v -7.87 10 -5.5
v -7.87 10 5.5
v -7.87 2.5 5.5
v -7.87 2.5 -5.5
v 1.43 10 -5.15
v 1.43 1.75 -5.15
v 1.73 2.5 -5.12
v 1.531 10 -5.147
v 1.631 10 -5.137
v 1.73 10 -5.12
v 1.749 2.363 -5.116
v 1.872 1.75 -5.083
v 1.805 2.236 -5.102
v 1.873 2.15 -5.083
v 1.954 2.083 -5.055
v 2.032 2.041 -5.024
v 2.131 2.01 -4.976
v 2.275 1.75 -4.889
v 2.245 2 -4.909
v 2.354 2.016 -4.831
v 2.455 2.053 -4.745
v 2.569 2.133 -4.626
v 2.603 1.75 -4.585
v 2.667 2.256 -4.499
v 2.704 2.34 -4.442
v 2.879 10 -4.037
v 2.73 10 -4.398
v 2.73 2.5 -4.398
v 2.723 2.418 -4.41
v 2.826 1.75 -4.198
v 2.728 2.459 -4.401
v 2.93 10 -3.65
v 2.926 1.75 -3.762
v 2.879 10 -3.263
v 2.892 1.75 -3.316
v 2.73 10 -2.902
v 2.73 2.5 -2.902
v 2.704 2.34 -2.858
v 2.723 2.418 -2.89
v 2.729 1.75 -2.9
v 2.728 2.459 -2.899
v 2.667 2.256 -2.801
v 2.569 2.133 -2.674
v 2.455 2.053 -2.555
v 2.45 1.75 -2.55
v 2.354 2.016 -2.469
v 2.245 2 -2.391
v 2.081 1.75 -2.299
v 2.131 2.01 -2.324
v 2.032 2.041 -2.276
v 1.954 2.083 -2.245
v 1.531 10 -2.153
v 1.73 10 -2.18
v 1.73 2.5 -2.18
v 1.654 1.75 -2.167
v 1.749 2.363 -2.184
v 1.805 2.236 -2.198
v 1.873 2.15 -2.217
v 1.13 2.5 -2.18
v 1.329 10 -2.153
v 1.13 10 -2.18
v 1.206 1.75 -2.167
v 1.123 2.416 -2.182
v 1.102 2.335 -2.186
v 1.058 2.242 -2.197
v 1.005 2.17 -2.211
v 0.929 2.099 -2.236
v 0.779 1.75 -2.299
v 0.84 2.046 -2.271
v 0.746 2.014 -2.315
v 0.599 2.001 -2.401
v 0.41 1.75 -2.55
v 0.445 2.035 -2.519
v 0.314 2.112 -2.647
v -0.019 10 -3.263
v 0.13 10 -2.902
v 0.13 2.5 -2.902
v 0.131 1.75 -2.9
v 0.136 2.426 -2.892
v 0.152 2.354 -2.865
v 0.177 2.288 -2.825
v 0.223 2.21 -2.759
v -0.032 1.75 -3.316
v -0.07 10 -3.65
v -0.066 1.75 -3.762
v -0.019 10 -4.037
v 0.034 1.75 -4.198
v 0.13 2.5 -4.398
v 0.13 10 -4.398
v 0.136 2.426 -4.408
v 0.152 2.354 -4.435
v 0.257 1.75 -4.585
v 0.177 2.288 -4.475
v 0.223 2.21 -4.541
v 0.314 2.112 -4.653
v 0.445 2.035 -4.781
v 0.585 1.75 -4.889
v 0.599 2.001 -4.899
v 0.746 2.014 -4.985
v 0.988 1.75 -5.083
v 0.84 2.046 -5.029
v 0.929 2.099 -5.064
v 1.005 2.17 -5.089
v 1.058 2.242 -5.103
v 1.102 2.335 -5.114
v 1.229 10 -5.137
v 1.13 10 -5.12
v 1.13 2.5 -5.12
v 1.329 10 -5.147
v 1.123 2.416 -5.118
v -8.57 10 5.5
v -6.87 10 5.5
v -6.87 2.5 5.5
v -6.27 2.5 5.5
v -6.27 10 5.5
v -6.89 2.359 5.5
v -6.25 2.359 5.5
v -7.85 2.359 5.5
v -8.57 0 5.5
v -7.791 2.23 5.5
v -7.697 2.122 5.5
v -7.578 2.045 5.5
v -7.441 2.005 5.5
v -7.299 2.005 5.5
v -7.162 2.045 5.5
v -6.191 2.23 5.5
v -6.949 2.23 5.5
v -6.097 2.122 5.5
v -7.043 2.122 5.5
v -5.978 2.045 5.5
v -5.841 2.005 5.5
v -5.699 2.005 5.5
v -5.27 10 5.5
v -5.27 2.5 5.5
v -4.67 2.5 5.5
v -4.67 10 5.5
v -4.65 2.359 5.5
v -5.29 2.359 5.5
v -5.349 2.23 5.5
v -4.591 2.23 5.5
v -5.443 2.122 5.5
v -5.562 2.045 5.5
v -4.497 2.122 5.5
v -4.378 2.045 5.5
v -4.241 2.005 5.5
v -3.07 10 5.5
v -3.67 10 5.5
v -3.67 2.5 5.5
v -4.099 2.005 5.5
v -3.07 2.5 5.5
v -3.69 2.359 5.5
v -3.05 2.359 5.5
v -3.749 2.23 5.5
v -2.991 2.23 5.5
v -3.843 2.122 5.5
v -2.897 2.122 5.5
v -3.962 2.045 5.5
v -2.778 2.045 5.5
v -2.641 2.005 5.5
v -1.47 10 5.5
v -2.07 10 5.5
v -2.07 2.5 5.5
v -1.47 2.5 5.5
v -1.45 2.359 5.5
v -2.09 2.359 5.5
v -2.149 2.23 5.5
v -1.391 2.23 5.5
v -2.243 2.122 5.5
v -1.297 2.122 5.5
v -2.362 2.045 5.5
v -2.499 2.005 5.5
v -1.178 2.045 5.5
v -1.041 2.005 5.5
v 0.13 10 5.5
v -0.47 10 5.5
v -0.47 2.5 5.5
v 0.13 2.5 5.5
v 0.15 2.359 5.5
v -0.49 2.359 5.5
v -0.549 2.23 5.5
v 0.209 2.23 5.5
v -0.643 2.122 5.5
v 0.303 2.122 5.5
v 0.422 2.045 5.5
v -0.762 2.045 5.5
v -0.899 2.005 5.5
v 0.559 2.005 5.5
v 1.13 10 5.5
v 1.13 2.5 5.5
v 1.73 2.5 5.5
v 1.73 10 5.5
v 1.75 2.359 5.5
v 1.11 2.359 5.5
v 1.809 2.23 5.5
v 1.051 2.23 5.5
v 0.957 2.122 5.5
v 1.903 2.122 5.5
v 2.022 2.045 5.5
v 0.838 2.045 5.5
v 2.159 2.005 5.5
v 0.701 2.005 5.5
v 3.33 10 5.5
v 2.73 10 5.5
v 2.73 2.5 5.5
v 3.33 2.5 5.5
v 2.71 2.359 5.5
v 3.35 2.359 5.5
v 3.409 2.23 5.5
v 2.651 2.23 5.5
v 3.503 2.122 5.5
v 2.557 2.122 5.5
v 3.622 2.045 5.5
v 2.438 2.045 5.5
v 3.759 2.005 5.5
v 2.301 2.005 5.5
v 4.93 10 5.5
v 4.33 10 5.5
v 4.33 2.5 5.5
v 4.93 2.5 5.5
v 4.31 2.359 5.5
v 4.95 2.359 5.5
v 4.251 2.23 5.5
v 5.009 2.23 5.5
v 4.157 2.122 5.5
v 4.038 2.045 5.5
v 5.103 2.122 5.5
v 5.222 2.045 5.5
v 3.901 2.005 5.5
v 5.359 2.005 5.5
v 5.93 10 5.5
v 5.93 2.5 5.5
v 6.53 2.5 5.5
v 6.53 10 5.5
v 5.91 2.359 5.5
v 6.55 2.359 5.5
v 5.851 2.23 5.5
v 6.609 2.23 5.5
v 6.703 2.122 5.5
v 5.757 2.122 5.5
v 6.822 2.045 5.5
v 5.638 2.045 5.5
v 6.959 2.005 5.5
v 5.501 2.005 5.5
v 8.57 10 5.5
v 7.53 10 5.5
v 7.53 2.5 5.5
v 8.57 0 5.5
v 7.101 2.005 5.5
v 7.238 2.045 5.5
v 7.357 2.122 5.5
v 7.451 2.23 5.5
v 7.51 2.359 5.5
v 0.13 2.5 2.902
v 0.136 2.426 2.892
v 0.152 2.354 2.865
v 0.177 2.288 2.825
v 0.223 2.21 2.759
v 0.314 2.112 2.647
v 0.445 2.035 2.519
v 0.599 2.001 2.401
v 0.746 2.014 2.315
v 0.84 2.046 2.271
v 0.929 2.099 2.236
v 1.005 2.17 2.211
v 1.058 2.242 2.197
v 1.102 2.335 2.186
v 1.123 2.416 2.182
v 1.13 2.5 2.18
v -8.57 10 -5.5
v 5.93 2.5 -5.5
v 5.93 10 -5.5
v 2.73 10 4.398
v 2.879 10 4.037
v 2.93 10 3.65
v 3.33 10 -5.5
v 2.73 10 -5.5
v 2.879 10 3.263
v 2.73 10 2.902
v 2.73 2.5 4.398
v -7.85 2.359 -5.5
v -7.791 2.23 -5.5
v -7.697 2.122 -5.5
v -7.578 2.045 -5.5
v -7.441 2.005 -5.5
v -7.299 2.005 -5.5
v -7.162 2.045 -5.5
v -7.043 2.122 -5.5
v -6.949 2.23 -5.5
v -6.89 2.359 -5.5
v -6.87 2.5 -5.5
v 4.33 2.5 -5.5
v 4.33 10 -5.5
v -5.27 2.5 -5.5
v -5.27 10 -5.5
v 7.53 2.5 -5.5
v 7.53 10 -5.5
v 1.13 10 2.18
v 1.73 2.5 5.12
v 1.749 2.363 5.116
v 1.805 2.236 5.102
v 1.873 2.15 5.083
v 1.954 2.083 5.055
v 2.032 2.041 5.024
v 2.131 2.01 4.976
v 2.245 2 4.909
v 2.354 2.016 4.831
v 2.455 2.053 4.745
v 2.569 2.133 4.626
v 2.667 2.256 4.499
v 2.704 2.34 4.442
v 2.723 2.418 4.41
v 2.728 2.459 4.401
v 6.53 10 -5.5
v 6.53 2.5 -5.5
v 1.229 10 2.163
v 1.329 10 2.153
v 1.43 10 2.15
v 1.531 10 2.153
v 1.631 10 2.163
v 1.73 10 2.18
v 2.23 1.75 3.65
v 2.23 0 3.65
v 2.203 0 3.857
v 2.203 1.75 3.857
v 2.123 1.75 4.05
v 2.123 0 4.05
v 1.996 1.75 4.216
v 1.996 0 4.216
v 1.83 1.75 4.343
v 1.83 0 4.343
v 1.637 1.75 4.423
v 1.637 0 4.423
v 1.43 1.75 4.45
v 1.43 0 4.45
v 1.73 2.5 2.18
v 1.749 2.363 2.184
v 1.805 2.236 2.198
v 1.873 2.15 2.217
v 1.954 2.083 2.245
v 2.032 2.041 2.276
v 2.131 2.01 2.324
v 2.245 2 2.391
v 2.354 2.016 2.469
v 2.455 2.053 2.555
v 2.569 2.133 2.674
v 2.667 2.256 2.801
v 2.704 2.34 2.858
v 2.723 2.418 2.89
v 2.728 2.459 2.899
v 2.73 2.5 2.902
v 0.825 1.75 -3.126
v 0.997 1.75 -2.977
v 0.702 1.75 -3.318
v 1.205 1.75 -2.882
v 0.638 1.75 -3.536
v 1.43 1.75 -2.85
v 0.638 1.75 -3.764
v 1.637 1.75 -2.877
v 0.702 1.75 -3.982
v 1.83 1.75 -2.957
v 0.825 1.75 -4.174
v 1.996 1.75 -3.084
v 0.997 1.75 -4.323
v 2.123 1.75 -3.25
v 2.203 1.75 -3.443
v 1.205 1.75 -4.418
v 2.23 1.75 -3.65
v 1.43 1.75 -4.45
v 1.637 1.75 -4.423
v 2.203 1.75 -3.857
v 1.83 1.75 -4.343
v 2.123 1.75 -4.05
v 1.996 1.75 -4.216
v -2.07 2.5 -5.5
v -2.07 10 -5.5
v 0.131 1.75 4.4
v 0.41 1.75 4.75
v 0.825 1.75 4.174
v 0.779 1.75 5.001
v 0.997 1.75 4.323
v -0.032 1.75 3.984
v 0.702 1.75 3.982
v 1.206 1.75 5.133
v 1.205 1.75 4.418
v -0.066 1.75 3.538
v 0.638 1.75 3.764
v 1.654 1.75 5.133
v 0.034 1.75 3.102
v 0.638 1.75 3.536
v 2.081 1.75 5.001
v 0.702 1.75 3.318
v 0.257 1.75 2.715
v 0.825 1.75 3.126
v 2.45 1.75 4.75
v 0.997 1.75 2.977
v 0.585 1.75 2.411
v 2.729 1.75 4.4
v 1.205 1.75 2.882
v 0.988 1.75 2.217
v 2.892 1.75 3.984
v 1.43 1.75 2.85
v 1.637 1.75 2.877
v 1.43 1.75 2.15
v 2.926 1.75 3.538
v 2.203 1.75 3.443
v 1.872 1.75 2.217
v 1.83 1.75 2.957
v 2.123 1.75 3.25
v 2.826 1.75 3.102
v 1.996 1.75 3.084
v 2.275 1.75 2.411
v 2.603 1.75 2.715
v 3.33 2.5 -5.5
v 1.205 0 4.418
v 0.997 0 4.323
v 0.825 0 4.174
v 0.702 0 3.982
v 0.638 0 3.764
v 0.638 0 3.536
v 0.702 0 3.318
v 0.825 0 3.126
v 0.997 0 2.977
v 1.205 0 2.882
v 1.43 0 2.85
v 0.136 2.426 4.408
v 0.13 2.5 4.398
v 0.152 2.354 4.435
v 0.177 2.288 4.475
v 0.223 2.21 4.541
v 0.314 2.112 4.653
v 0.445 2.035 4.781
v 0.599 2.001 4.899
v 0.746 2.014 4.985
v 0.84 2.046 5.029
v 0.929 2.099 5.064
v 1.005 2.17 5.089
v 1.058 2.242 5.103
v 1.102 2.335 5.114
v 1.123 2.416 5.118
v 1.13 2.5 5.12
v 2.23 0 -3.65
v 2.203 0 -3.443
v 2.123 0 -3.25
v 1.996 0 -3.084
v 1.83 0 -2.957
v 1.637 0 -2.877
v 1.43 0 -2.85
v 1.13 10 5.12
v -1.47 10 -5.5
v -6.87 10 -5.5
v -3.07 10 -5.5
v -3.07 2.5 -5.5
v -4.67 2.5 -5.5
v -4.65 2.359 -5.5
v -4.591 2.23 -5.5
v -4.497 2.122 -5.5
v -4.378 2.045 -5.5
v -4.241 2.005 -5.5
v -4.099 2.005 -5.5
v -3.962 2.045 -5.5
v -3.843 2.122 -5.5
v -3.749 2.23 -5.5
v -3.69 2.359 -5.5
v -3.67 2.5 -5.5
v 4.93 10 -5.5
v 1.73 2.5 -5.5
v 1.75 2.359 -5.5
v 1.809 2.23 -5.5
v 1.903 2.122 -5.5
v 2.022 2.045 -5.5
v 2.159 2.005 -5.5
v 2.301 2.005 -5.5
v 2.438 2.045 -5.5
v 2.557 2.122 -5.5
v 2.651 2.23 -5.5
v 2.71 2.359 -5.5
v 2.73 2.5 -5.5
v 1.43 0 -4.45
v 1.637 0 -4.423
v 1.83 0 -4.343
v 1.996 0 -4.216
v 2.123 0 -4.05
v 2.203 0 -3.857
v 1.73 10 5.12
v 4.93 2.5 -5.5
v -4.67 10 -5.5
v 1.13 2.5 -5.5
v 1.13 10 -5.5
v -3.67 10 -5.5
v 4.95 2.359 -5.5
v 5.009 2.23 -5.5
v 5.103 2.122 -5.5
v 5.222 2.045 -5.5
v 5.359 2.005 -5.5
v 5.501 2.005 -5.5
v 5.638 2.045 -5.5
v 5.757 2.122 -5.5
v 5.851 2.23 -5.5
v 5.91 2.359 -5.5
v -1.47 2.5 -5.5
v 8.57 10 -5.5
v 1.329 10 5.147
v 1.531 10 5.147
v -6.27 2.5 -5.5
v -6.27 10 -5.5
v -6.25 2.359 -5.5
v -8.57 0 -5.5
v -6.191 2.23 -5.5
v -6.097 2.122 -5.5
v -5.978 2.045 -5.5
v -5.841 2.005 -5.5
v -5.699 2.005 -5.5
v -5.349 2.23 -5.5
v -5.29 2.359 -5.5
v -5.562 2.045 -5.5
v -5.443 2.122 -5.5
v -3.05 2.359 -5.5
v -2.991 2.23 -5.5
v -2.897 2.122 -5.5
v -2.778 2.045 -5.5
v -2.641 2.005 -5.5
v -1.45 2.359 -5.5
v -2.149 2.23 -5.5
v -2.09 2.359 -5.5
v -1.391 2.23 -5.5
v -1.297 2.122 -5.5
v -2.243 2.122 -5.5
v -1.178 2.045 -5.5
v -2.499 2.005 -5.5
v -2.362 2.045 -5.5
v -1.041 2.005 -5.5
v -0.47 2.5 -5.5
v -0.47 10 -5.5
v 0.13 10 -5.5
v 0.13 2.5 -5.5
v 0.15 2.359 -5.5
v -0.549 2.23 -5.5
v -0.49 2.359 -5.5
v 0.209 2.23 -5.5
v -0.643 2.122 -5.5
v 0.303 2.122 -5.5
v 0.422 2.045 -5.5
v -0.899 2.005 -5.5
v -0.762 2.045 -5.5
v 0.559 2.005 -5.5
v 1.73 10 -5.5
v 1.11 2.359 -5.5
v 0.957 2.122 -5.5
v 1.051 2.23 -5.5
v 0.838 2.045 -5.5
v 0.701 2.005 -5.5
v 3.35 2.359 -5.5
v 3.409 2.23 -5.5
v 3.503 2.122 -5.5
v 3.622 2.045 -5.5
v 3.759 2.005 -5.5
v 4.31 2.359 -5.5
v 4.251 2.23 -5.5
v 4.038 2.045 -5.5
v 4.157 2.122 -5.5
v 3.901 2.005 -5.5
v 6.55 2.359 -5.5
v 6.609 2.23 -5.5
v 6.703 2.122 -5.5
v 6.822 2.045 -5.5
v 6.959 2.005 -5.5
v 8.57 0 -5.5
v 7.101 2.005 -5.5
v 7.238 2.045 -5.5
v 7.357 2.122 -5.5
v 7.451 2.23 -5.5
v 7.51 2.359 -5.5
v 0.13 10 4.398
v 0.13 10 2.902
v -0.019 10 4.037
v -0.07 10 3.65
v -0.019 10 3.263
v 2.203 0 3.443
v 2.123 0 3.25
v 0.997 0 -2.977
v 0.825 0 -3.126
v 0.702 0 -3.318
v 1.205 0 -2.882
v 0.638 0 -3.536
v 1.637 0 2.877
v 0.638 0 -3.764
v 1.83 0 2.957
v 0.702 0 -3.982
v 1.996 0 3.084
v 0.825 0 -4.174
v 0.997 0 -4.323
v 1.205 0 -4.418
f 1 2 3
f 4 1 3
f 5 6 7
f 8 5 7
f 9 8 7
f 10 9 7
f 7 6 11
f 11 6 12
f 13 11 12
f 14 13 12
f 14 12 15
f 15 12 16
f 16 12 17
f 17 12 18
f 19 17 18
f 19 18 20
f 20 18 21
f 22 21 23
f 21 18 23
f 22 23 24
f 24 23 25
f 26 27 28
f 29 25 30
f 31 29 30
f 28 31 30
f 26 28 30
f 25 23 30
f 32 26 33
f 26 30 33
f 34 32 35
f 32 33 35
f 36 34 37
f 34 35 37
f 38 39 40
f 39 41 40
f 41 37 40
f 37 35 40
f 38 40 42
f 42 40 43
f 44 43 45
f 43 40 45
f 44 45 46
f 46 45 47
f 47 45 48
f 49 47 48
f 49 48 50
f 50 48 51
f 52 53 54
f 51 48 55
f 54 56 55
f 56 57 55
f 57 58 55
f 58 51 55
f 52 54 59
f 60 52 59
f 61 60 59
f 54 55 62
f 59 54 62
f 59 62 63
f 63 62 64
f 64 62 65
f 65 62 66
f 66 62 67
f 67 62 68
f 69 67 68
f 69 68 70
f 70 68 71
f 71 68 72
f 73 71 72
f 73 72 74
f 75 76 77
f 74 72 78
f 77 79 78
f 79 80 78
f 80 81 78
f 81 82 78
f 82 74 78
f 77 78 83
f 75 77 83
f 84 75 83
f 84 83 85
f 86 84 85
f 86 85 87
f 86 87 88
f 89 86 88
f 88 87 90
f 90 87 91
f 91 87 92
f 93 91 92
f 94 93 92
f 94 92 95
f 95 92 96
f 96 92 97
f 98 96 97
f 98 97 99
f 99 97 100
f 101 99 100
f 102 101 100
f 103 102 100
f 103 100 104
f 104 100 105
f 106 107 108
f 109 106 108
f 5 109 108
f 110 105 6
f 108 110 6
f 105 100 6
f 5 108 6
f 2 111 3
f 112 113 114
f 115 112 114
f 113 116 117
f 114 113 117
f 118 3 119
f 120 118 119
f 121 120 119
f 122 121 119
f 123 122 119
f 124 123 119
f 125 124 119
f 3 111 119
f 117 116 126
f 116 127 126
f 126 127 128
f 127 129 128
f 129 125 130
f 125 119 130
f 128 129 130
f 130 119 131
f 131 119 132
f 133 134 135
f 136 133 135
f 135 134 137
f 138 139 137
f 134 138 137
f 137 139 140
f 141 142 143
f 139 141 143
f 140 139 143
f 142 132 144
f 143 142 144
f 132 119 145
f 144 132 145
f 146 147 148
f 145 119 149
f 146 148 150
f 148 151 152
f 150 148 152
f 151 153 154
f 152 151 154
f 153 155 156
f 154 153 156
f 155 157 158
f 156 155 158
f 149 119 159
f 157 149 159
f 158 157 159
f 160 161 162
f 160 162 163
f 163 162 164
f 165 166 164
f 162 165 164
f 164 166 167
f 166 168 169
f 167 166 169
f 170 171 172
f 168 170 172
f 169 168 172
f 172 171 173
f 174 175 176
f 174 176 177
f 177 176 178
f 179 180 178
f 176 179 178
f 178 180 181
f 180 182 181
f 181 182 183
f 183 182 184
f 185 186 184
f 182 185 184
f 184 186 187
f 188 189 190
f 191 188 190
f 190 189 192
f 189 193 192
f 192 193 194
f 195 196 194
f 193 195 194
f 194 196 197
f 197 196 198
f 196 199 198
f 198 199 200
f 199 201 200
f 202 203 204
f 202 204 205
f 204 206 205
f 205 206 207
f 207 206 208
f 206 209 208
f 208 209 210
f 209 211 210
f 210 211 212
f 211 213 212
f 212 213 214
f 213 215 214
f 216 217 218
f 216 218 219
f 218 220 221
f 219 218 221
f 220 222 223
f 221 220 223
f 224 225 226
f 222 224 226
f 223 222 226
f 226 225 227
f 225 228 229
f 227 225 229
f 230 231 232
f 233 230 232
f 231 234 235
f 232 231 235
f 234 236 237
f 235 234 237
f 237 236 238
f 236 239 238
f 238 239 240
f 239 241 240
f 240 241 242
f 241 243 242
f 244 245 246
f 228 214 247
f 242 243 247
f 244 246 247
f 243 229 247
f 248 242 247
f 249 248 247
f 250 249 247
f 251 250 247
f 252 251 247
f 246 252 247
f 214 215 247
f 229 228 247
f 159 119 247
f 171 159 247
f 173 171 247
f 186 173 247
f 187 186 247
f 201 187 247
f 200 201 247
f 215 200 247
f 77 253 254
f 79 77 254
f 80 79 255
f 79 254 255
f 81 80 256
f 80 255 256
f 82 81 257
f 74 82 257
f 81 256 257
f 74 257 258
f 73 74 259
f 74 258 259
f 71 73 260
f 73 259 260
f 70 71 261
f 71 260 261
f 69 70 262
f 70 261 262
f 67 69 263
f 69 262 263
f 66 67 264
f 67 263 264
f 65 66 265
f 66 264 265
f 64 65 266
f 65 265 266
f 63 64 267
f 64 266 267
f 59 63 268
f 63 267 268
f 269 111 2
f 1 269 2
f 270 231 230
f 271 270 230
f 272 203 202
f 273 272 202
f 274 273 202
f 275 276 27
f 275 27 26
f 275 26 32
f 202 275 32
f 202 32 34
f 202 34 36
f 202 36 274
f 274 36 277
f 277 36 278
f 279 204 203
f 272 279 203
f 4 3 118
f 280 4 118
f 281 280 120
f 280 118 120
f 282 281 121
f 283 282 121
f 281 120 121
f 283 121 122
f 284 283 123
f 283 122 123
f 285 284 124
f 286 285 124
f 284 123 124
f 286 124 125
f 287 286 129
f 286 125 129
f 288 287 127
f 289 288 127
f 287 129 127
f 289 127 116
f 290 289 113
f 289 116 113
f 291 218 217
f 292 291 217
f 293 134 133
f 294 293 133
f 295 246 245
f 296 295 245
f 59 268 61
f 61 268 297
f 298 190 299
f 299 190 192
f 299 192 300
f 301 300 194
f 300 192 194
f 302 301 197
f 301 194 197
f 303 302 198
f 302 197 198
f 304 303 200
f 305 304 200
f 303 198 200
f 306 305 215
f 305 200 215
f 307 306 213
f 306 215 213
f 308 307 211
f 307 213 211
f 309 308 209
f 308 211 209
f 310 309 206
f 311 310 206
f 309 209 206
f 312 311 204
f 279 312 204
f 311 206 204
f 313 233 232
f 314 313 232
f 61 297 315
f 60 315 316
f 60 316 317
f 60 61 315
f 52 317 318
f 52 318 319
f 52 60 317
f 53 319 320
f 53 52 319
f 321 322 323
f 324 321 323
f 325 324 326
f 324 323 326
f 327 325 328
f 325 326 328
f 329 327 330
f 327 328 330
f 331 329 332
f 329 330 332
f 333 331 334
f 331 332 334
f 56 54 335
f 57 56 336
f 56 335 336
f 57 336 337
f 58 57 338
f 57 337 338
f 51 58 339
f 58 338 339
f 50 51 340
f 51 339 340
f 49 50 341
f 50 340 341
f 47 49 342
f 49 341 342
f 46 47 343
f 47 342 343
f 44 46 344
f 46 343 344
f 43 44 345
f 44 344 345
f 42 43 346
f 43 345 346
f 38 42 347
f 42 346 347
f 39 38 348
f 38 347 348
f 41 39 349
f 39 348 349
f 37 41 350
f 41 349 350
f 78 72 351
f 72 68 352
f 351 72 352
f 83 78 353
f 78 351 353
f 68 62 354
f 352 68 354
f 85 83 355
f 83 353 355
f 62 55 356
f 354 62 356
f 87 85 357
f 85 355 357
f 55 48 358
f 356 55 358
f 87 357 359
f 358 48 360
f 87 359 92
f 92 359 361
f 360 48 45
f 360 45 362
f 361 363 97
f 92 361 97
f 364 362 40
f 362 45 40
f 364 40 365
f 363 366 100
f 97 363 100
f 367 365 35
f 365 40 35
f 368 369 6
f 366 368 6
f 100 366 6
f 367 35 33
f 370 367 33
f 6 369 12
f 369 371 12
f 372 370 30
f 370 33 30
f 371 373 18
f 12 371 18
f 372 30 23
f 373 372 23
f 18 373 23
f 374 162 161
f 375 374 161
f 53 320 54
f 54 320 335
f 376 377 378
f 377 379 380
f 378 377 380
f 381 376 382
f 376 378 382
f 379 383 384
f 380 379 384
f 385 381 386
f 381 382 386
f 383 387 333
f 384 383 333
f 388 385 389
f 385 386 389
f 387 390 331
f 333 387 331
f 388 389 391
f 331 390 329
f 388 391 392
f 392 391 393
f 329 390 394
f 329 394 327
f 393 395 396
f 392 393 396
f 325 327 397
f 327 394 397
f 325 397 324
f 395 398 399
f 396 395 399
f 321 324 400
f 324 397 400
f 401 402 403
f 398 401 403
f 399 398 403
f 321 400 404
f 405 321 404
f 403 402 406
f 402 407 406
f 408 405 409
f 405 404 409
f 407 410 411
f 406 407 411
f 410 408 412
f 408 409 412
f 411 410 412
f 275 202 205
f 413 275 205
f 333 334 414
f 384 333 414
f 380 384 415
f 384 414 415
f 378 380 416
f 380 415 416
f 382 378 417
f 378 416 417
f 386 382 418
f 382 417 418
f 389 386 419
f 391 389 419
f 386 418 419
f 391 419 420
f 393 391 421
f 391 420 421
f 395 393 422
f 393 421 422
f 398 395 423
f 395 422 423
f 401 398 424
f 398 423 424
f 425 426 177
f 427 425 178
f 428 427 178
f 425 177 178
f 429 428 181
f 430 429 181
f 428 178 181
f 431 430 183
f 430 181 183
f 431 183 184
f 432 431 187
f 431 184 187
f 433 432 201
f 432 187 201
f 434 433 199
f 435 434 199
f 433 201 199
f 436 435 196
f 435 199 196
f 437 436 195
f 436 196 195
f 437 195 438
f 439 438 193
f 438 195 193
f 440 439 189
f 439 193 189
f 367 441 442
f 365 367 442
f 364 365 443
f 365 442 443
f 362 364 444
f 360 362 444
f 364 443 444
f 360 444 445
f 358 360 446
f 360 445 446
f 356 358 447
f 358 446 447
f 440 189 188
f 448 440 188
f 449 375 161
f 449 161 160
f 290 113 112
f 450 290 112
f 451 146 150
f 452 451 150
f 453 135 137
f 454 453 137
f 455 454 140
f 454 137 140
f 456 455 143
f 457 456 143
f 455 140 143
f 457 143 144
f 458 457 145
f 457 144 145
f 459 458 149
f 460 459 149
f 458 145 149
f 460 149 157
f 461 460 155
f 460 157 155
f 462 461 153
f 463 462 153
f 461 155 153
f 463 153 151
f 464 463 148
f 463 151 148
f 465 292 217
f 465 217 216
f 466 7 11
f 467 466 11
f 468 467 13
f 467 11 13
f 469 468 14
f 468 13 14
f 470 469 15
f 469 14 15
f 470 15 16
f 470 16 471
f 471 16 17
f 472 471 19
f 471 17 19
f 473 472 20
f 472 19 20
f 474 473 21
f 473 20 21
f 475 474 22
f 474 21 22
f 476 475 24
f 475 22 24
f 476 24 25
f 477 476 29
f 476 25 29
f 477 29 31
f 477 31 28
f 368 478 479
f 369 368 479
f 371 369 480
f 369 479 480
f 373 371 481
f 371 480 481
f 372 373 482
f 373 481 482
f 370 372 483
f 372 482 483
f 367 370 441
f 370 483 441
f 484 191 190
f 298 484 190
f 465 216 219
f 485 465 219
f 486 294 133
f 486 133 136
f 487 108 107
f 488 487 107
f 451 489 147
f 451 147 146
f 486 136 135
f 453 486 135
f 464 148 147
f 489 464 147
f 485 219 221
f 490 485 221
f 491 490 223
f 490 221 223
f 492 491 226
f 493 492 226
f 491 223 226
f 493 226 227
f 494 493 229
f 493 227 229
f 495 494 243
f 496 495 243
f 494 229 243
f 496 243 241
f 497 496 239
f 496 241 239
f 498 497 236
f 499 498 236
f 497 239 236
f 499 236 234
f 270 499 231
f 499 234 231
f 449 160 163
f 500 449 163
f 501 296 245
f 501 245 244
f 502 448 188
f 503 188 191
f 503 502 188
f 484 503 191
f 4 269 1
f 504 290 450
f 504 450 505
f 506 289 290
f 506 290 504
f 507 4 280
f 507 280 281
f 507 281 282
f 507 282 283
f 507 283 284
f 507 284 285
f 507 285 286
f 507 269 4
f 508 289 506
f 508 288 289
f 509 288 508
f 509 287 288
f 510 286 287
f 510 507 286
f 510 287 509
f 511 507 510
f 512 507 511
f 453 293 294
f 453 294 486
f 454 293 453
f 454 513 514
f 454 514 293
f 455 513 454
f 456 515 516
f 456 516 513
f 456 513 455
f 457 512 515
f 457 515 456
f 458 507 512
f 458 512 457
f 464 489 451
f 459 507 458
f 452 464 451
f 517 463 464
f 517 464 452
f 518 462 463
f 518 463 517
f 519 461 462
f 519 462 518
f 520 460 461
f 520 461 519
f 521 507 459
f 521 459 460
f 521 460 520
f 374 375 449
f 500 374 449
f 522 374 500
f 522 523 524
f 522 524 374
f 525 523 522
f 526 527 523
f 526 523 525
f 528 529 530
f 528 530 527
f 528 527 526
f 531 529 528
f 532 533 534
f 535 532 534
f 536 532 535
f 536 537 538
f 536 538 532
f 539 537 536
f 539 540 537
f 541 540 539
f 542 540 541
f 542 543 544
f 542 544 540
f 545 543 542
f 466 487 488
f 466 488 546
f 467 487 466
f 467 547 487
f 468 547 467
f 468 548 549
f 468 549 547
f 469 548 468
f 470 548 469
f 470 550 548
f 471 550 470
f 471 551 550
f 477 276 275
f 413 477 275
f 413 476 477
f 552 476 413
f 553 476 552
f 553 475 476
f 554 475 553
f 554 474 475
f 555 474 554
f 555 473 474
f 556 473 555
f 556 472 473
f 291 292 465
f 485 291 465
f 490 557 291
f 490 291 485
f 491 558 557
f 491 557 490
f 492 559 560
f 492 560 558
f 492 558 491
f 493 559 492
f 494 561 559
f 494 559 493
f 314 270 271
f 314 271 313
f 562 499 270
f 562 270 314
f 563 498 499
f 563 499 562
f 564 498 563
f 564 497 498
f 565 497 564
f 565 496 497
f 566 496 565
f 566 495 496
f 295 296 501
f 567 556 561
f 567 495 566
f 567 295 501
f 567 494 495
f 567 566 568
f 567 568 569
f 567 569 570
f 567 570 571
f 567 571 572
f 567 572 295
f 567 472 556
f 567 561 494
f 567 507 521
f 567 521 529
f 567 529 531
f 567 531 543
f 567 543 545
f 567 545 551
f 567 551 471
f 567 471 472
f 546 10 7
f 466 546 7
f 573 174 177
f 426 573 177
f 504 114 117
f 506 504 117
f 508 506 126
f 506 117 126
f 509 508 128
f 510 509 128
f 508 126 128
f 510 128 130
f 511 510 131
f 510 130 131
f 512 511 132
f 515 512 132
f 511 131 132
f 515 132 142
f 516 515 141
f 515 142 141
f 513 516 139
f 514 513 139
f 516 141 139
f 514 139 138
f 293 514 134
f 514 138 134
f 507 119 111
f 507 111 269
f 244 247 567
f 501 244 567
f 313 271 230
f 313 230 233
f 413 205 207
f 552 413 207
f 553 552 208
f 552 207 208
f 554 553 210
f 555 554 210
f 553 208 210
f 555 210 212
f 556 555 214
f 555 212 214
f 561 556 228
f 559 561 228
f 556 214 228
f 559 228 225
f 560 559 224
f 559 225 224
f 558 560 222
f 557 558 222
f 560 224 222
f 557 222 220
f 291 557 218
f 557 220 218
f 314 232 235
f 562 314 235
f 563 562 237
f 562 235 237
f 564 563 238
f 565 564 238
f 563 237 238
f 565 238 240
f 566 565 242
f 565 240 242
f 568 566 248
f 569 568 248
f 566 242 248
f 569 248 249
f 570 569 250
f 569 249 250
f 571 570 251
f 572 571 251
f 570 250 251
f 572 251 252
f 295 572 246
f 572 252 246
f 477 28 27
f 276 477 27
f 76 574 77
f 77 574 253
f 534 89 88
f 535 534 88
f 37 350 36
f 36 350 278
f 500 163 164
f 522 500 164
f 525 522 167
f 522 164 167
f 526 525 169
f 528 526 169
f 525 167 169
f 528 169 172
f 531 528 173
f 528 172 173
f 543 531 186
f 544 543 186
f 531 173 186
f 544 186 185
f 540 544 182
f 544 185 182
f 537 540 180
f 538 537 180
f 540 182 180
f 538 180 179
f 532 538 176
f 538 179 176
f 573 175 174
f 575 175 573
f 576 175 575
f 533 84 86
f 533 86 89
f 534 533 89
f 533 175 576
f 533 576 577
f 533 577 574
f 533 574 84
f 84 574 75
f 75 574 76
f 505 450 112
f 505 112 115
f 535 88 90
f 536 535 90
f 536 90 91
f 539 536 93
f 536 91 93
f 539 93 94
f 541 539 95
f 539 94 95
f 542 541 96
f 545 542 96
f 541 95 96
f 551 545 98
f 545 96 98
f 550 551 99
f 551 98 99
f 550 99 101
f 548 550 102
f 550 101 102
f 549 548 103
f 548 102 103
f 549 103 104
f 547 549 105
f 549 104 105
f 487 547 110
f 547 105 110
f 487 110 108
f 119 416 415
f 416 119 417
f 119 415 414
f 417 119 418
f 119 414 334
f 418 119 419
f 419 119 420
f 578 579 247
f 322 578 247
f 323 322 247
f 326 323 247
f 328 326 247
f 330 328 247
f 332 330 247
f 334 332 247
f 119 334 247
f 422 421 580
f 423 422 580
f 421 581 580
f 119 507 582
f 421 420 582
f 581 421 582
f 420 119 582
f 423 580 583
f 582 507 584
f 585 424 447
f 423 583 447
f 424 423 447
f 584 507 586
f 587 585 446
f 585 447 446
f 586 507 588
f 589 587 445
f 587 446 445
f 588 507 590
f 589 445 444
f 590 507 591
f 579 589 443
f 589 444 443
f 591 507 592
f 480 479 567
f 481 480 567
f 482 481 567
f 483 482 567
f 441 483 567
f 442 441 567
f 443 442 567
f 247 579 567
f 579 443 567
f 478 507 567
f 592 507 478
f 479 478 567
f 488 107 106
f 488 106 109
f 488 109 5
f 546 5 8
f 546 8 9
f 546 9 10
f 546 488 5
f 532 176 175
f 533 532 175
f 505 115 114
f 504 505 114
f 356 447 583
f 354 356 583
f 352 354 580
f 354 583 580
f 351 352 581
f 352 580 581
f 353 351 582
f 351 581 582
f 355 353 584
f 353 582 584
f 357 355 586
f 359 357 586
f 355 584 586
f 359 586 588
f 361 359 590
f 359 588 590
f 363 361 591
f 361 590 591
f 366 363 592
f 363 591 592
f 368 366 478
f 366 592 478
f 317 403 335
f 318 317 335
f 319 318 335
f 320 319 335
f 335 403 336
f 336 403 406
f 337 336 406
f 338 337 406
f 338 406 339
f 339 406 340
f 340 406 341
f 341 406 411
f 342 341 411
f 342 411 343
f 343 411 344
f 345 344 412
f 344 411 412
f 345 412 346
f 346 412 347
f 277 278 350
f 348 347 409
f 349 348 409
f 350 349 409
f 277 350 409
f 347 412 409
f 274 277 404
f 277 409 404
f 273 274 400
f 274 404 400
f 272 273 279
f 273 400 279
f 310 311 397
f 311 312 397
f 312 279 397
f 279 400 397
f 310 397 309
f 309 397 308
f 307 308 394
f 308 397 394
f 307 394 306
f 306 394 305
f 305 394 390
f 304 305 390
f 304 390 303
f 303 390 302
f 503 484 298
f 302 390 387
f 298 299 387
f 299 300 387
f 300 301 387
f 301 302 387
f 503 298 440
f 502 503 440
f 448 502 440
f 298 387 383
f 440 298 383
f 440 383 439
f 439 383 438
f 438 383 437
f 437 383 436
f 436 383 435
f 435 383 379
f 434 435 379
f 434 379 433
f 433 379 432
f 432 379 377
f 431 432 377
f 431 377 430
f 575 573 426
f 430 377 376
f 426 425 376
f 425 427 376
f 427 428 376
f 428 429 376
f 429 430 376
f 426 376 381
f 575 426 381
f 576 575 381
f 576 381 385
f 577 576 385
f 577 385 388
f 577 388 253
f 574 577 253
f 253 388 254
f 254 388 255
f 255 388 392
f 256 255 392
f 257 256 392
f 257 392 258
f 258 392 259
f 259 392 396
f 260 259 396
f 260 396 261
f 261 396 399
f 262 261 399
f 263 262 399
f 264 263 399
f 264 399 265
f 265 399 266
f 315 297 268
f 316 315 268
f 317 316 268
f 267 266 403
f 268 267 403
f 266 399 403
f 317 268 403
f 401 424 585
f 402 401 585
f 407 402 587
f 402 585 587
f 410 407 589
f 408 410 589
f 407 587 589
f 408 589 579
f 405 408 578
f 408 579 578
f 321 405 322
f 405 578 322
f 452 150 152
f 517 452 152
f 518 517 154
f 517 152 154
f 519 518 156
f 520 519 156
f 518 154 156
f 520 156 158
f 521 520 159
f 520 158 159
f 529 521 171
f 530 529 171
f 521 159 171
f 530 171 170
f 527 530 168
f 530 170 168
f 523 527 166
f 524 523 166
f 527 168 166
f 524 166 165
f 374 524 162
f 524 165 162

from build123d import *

# Parameters (mm, degrees)
SKETCH_1_W          = 17.14
SKETCH_1_H          = 11
EXTRUDE_1_DEPTH     = 10
CUT_EXTRUDE_1_DEPTH = 18.159396843
CUT_EXTRUDE_2_DEPTH = 1.75
SKETCH_4_R          = 1.5
CUT_EXTRUDE_3_DEPTH = 14.105624747


with BuildPart() as part:
    # 草图1 → 凸台-拉伸1 (new body)
    with BuildSketch(Plane(origin=(0, 0, 0), x_dir=(1, 0, 0), z_dir=(0, 1, 0))):
        Rectangle(SKETCH_1_W, SKETCH_1_H)
    extrude(amount=EXTRUDE_1_DEPTH)

    # 草图2 → 切除-拉伸1 (cut, through all)
    with BuildSketch(Plane.XY.offset(5.5)):
        with BuildLine():
            Line((-6.87, 10), (-7.87, 10))
            Line((-7.87, 10), (-7.87, 2.5))
            ThreePointArc((-7.87, 2.5), (-7.37, 3), (-6.87, 2.5))
            Line((-6.87, 2.5), (-6.87, 10))
        make_face()
        with BuildLine():
            Line((-5.27, 10), (-6.27, 10))
            Line((-6.27, 10), (-6.27, 2.5))
            ThreePointArc((-6.27, 2.5), (-5.77, 3), (-5.27, 2.5))
            Line((-5.27, 2.5), (-5.27, 10))
        make_face()
        with BuildLine():
            ThreePointArc((-6.87, 2.5), (-7.37, 3), (-7.87, 2.5))
            Line((-7.87, 2.5), (-6.87, 2.5))
        make_face()
        with BuildLine():
            Line((-6.87, 2.5), (-7.87, 2.5))
            ThreePointArc((-7.87, 2.5), (-7.37, 2), (-6.87, 2.5))
        make_face()
        with BuildLine():
            ThreePointArc((-5.27, 2.5), (-5.77, 3), (-6.27, 2.5))
            Line((-6.27, 2.5), (-5.27, 2.5))
        make_face()
        with BuildLine():
            Line((-5.27, 2.5), (-6.27, 2.5))
            ThreePointArc((-6.27, 2.5), (-5.77, 2), (-5.27, 2.5))
        make_face()
        with BuildLine():
            Line((-3.67, 10), (-4.67, 10))
            Line((-4.67, 10), (-4.67, 2.5))
            ThreePointArc((-4.67, 2.5), (-4.17, 3), (-3.67, 2.5))
            Line((-3.67, 2.5), (-3.67, 10))
        make_face()
        with BuildLine():
            ThreePointArc((-3.67, 2.5), (-4.17, 3), (-4.67, 2.5))
            Line((-4.67, 2.5), (-3.67, 2.5))
        make_face()
        with BuildLine():
            Line((-3.67, 2.5), (-4.67, 2.5))
            ThreePointArc((-4.67, 2.5), (-4.17, 2), (-3.67, 2.5))
        make_face()
        with BuildLine():
            Line((-2.07, 10), (-3.07, 10))
            Line((-3.07, 10), (-3.07, 2.5))
            ThreePointArc((-3.07, 2.5), (-2.57, 3), (-2.07, 2.5))
            Line((-2.07, 2.5), (-2.07, 10))
        make_face()
        with BuildLine():
            ThreePointArc((-2.07, 2.5), (-2.57, 3), (-3.07, 2.5))
            Line((-3.07, 2.5), (-2.07, 2.5))
        make_face()
        with BuildLine():
            Line((-2.07, 2.5), (-3.07, 2.5))
            ThreePointArc((-3.07, 2.5), (-2.57, 2), (-2.07, 2.5))
        make_face()
        with BuildLine():
            Line((-0.47, 10), (-1.47, 10))
            Line((-1.47, 10), (-1.47, 2.5))
            ThreePointArc((-1.47, 2.5), (-0.97, 3), (-0.47, 2.5))
            Line((-0.47, 2.5), (-0.47, 10))
        make_face()
        with BuildLine():
            ThreePointArc((-0.47, 2.5), (-0.97, 3), (-1.47, 2.5))
            Line((-1.47, 2.5), (-0.47, 2.5))
        make_face()
        with BuildLine():
            Line((-0.47, 2.5), (-1.47, 2.5))
            ThreePointArc((-1.47, 2.5), (-0.97, 2), (-0.47, 2.5))
        make_face()
        with BuildLine():
            Line((1.13, 10), (0.13, 10))
            Line((0.13, 10), (0.13, 2.5))
            ThreePointArc((0.13, 2.5), (0.63, 3), (1.13, 2.5))
            Line((1.13, 2.5), (1.13, 10))
        make_face()
        with BuildLine():
            ThreePointArc((1.13, 2.5), (0.63, 3), (0.13, 2.5))
            Line((0.13, 2.5), (1.13, 2.5))
        make_face()
        with BuildLine():
            Line((1.13, 2.5), (0.13, 2.5))
            ThreePointArc((0.13, 2.5), (0.63, 2), (1.13, 2.5))
        make_face()
        with BuildLine():
            Line((2.73, 10), (1.73, 10))
            Line((1.73, 10), (1.73, 2.5))
            ThreePointArc((1.73, 2.5), (2.23, 3), (2.73, 2.5))
            Line((2.73, 2.5), (2.73, 10))
        make_face()
        with BuildLine():
            ThreePointArc((2.73, 2.5), (2.23, 3), (1.73, 2.5))
            Line((1.73, 2.5), (2.73, 2.5))
        make_face()
        with BuildLine():
            Line((2.73, 2.5), (1.73, 2.5))
            ThreePointArc((1.73, 2.5), (2.23, 2), (2.73, 2.5))
        make_face()
        with BuildLine():
            Line((4.33, 10), (3.33, 10))
            Line((3.33, 10), (3.33, 2.5))
            ThreePointArc((3.33, 2.5), (3.83, 3), (4.33, 2.5))
            Line((4.33, 2.5), (4.33, 10))
        make_face()
        with BuildLine():
            ThreePointArc((4.33, 2.5), (3.83, 3), (3.33, 2.5))
            Line((3.33, 2.5), (4.33, 2.5))
        make_face()
        with BuildLine():
            Line((4.33, 2.5), (3.33, 2.5))
            ThreePointArc((3.33, 2.5), (3.83, 2), (4.33, 2.5))
        make_face()
        with BuildLine():
            Line((5.93, 10), (4.93, 10))
            Line((4.93, 10), (4.93, 2.5))
            ThreePointArc((4.93, 2.5), (5.43, 3), (5.93, 2.5))
            Line((5.93, 2.5), (5.93, 10))
        make_face()
        with BuildLine():
            ThreePointArc((5.93, 2.5), (5.43, 3), (4.93, 2.5))
            Line((4.93, 2.5), (5.93, 2.5))
        make_face()
        with BuildLine():
            Line((5.93, 2.5), (4.93, 2.5))
            ThreePointArc((4.93, 2.5), (5.43, 2), (5.93, 2.5))
        make_face()
        with BuildLine():
            Line((7.53, 10), (6.53, 10))
            Line((6.53, 10), (6.53, 2.5))
            ThreePointArc((6.53, 2.5), (7.03, 3), (7.53, 2.5))
            Line((7.53, 2.5), (7.53, 10))
        make_face()
        with BuildLine():
            ThreePointArc((7.53, 2.5), (7.03, 3), (6.53, 2.5))
            Line((6.53, 2.5), (7.53, 2.5))
        make_face()
        with BuildLine():
            Line((7.53, 2.5), (6.53, 2.5))
            ThreePointArc((6.53, 2.5), (7.03, 2), (7.53, 2.5))
        make_face()
    extrude(amount=-CUT_EXTRUDE_1_DEPTH, mode=Mode.SUBTRACT)

    # 草图3 → 切除-拉伸2 (cut)
    with BuildSketch(Plane.XZ):
        with BuildLine():
            ThreePointArc((2.23, 3.65), (1.995685425, 4.215685425), (1.43, 4.45))
            Line((1.43, 4.45), (1.43, 2.85))
            ThreePointArc((1.43, 2.85), (1.995685425, 3.084314575), (2.23, 3.65))
        make_face()
        with BuildLine():
            Line((1.43, 2.85), (1.43, 4.45))
            ThreePointArc((1.43, 4.45), (0.63, 3.65), (1.43, 2.85))
        make_face()
        with BuildLine():
            ThreePointArc((2.23, -3.65), (1.995685425, -3.084314575), (1.43, -2.85))
            Line((1.43, -2.85), (1.43, -4.45))
            ThreePointArc((1.43, -4.45), (1.995685425, -4.215685425), (2.23, -3.65))
        make_face()
        with BuildLine():
            Line((1.43, -4.45), (1.43, -2.85))
            ThreePointArc((1.43, -2.85), (0.63, -3.65), (1.43, -4.45))
        make_face()
    extrude(amount=-CUT_EXTRUDE_2_DEPTH, mode=Mode.SUBTRACT)

    # 草图4 → 切除-拉伸3 (cut, through all)
    with BuildSketch(Plane.XZ.offset(-1.75)):
        with Locations(Location((1.43, 3.65, 0), (0, 0, 270))):
            Circle(SKETCH_4_R)
        with Locations(Location((1.43, -3.65, 0), (0, 0, 270))):
            Circle(SKETCH_4_R)
    extrude(amount=-CUT_EXTRUDE_3_DEPTH, mode=Mode.SUBTRACT)


solid = part.part
